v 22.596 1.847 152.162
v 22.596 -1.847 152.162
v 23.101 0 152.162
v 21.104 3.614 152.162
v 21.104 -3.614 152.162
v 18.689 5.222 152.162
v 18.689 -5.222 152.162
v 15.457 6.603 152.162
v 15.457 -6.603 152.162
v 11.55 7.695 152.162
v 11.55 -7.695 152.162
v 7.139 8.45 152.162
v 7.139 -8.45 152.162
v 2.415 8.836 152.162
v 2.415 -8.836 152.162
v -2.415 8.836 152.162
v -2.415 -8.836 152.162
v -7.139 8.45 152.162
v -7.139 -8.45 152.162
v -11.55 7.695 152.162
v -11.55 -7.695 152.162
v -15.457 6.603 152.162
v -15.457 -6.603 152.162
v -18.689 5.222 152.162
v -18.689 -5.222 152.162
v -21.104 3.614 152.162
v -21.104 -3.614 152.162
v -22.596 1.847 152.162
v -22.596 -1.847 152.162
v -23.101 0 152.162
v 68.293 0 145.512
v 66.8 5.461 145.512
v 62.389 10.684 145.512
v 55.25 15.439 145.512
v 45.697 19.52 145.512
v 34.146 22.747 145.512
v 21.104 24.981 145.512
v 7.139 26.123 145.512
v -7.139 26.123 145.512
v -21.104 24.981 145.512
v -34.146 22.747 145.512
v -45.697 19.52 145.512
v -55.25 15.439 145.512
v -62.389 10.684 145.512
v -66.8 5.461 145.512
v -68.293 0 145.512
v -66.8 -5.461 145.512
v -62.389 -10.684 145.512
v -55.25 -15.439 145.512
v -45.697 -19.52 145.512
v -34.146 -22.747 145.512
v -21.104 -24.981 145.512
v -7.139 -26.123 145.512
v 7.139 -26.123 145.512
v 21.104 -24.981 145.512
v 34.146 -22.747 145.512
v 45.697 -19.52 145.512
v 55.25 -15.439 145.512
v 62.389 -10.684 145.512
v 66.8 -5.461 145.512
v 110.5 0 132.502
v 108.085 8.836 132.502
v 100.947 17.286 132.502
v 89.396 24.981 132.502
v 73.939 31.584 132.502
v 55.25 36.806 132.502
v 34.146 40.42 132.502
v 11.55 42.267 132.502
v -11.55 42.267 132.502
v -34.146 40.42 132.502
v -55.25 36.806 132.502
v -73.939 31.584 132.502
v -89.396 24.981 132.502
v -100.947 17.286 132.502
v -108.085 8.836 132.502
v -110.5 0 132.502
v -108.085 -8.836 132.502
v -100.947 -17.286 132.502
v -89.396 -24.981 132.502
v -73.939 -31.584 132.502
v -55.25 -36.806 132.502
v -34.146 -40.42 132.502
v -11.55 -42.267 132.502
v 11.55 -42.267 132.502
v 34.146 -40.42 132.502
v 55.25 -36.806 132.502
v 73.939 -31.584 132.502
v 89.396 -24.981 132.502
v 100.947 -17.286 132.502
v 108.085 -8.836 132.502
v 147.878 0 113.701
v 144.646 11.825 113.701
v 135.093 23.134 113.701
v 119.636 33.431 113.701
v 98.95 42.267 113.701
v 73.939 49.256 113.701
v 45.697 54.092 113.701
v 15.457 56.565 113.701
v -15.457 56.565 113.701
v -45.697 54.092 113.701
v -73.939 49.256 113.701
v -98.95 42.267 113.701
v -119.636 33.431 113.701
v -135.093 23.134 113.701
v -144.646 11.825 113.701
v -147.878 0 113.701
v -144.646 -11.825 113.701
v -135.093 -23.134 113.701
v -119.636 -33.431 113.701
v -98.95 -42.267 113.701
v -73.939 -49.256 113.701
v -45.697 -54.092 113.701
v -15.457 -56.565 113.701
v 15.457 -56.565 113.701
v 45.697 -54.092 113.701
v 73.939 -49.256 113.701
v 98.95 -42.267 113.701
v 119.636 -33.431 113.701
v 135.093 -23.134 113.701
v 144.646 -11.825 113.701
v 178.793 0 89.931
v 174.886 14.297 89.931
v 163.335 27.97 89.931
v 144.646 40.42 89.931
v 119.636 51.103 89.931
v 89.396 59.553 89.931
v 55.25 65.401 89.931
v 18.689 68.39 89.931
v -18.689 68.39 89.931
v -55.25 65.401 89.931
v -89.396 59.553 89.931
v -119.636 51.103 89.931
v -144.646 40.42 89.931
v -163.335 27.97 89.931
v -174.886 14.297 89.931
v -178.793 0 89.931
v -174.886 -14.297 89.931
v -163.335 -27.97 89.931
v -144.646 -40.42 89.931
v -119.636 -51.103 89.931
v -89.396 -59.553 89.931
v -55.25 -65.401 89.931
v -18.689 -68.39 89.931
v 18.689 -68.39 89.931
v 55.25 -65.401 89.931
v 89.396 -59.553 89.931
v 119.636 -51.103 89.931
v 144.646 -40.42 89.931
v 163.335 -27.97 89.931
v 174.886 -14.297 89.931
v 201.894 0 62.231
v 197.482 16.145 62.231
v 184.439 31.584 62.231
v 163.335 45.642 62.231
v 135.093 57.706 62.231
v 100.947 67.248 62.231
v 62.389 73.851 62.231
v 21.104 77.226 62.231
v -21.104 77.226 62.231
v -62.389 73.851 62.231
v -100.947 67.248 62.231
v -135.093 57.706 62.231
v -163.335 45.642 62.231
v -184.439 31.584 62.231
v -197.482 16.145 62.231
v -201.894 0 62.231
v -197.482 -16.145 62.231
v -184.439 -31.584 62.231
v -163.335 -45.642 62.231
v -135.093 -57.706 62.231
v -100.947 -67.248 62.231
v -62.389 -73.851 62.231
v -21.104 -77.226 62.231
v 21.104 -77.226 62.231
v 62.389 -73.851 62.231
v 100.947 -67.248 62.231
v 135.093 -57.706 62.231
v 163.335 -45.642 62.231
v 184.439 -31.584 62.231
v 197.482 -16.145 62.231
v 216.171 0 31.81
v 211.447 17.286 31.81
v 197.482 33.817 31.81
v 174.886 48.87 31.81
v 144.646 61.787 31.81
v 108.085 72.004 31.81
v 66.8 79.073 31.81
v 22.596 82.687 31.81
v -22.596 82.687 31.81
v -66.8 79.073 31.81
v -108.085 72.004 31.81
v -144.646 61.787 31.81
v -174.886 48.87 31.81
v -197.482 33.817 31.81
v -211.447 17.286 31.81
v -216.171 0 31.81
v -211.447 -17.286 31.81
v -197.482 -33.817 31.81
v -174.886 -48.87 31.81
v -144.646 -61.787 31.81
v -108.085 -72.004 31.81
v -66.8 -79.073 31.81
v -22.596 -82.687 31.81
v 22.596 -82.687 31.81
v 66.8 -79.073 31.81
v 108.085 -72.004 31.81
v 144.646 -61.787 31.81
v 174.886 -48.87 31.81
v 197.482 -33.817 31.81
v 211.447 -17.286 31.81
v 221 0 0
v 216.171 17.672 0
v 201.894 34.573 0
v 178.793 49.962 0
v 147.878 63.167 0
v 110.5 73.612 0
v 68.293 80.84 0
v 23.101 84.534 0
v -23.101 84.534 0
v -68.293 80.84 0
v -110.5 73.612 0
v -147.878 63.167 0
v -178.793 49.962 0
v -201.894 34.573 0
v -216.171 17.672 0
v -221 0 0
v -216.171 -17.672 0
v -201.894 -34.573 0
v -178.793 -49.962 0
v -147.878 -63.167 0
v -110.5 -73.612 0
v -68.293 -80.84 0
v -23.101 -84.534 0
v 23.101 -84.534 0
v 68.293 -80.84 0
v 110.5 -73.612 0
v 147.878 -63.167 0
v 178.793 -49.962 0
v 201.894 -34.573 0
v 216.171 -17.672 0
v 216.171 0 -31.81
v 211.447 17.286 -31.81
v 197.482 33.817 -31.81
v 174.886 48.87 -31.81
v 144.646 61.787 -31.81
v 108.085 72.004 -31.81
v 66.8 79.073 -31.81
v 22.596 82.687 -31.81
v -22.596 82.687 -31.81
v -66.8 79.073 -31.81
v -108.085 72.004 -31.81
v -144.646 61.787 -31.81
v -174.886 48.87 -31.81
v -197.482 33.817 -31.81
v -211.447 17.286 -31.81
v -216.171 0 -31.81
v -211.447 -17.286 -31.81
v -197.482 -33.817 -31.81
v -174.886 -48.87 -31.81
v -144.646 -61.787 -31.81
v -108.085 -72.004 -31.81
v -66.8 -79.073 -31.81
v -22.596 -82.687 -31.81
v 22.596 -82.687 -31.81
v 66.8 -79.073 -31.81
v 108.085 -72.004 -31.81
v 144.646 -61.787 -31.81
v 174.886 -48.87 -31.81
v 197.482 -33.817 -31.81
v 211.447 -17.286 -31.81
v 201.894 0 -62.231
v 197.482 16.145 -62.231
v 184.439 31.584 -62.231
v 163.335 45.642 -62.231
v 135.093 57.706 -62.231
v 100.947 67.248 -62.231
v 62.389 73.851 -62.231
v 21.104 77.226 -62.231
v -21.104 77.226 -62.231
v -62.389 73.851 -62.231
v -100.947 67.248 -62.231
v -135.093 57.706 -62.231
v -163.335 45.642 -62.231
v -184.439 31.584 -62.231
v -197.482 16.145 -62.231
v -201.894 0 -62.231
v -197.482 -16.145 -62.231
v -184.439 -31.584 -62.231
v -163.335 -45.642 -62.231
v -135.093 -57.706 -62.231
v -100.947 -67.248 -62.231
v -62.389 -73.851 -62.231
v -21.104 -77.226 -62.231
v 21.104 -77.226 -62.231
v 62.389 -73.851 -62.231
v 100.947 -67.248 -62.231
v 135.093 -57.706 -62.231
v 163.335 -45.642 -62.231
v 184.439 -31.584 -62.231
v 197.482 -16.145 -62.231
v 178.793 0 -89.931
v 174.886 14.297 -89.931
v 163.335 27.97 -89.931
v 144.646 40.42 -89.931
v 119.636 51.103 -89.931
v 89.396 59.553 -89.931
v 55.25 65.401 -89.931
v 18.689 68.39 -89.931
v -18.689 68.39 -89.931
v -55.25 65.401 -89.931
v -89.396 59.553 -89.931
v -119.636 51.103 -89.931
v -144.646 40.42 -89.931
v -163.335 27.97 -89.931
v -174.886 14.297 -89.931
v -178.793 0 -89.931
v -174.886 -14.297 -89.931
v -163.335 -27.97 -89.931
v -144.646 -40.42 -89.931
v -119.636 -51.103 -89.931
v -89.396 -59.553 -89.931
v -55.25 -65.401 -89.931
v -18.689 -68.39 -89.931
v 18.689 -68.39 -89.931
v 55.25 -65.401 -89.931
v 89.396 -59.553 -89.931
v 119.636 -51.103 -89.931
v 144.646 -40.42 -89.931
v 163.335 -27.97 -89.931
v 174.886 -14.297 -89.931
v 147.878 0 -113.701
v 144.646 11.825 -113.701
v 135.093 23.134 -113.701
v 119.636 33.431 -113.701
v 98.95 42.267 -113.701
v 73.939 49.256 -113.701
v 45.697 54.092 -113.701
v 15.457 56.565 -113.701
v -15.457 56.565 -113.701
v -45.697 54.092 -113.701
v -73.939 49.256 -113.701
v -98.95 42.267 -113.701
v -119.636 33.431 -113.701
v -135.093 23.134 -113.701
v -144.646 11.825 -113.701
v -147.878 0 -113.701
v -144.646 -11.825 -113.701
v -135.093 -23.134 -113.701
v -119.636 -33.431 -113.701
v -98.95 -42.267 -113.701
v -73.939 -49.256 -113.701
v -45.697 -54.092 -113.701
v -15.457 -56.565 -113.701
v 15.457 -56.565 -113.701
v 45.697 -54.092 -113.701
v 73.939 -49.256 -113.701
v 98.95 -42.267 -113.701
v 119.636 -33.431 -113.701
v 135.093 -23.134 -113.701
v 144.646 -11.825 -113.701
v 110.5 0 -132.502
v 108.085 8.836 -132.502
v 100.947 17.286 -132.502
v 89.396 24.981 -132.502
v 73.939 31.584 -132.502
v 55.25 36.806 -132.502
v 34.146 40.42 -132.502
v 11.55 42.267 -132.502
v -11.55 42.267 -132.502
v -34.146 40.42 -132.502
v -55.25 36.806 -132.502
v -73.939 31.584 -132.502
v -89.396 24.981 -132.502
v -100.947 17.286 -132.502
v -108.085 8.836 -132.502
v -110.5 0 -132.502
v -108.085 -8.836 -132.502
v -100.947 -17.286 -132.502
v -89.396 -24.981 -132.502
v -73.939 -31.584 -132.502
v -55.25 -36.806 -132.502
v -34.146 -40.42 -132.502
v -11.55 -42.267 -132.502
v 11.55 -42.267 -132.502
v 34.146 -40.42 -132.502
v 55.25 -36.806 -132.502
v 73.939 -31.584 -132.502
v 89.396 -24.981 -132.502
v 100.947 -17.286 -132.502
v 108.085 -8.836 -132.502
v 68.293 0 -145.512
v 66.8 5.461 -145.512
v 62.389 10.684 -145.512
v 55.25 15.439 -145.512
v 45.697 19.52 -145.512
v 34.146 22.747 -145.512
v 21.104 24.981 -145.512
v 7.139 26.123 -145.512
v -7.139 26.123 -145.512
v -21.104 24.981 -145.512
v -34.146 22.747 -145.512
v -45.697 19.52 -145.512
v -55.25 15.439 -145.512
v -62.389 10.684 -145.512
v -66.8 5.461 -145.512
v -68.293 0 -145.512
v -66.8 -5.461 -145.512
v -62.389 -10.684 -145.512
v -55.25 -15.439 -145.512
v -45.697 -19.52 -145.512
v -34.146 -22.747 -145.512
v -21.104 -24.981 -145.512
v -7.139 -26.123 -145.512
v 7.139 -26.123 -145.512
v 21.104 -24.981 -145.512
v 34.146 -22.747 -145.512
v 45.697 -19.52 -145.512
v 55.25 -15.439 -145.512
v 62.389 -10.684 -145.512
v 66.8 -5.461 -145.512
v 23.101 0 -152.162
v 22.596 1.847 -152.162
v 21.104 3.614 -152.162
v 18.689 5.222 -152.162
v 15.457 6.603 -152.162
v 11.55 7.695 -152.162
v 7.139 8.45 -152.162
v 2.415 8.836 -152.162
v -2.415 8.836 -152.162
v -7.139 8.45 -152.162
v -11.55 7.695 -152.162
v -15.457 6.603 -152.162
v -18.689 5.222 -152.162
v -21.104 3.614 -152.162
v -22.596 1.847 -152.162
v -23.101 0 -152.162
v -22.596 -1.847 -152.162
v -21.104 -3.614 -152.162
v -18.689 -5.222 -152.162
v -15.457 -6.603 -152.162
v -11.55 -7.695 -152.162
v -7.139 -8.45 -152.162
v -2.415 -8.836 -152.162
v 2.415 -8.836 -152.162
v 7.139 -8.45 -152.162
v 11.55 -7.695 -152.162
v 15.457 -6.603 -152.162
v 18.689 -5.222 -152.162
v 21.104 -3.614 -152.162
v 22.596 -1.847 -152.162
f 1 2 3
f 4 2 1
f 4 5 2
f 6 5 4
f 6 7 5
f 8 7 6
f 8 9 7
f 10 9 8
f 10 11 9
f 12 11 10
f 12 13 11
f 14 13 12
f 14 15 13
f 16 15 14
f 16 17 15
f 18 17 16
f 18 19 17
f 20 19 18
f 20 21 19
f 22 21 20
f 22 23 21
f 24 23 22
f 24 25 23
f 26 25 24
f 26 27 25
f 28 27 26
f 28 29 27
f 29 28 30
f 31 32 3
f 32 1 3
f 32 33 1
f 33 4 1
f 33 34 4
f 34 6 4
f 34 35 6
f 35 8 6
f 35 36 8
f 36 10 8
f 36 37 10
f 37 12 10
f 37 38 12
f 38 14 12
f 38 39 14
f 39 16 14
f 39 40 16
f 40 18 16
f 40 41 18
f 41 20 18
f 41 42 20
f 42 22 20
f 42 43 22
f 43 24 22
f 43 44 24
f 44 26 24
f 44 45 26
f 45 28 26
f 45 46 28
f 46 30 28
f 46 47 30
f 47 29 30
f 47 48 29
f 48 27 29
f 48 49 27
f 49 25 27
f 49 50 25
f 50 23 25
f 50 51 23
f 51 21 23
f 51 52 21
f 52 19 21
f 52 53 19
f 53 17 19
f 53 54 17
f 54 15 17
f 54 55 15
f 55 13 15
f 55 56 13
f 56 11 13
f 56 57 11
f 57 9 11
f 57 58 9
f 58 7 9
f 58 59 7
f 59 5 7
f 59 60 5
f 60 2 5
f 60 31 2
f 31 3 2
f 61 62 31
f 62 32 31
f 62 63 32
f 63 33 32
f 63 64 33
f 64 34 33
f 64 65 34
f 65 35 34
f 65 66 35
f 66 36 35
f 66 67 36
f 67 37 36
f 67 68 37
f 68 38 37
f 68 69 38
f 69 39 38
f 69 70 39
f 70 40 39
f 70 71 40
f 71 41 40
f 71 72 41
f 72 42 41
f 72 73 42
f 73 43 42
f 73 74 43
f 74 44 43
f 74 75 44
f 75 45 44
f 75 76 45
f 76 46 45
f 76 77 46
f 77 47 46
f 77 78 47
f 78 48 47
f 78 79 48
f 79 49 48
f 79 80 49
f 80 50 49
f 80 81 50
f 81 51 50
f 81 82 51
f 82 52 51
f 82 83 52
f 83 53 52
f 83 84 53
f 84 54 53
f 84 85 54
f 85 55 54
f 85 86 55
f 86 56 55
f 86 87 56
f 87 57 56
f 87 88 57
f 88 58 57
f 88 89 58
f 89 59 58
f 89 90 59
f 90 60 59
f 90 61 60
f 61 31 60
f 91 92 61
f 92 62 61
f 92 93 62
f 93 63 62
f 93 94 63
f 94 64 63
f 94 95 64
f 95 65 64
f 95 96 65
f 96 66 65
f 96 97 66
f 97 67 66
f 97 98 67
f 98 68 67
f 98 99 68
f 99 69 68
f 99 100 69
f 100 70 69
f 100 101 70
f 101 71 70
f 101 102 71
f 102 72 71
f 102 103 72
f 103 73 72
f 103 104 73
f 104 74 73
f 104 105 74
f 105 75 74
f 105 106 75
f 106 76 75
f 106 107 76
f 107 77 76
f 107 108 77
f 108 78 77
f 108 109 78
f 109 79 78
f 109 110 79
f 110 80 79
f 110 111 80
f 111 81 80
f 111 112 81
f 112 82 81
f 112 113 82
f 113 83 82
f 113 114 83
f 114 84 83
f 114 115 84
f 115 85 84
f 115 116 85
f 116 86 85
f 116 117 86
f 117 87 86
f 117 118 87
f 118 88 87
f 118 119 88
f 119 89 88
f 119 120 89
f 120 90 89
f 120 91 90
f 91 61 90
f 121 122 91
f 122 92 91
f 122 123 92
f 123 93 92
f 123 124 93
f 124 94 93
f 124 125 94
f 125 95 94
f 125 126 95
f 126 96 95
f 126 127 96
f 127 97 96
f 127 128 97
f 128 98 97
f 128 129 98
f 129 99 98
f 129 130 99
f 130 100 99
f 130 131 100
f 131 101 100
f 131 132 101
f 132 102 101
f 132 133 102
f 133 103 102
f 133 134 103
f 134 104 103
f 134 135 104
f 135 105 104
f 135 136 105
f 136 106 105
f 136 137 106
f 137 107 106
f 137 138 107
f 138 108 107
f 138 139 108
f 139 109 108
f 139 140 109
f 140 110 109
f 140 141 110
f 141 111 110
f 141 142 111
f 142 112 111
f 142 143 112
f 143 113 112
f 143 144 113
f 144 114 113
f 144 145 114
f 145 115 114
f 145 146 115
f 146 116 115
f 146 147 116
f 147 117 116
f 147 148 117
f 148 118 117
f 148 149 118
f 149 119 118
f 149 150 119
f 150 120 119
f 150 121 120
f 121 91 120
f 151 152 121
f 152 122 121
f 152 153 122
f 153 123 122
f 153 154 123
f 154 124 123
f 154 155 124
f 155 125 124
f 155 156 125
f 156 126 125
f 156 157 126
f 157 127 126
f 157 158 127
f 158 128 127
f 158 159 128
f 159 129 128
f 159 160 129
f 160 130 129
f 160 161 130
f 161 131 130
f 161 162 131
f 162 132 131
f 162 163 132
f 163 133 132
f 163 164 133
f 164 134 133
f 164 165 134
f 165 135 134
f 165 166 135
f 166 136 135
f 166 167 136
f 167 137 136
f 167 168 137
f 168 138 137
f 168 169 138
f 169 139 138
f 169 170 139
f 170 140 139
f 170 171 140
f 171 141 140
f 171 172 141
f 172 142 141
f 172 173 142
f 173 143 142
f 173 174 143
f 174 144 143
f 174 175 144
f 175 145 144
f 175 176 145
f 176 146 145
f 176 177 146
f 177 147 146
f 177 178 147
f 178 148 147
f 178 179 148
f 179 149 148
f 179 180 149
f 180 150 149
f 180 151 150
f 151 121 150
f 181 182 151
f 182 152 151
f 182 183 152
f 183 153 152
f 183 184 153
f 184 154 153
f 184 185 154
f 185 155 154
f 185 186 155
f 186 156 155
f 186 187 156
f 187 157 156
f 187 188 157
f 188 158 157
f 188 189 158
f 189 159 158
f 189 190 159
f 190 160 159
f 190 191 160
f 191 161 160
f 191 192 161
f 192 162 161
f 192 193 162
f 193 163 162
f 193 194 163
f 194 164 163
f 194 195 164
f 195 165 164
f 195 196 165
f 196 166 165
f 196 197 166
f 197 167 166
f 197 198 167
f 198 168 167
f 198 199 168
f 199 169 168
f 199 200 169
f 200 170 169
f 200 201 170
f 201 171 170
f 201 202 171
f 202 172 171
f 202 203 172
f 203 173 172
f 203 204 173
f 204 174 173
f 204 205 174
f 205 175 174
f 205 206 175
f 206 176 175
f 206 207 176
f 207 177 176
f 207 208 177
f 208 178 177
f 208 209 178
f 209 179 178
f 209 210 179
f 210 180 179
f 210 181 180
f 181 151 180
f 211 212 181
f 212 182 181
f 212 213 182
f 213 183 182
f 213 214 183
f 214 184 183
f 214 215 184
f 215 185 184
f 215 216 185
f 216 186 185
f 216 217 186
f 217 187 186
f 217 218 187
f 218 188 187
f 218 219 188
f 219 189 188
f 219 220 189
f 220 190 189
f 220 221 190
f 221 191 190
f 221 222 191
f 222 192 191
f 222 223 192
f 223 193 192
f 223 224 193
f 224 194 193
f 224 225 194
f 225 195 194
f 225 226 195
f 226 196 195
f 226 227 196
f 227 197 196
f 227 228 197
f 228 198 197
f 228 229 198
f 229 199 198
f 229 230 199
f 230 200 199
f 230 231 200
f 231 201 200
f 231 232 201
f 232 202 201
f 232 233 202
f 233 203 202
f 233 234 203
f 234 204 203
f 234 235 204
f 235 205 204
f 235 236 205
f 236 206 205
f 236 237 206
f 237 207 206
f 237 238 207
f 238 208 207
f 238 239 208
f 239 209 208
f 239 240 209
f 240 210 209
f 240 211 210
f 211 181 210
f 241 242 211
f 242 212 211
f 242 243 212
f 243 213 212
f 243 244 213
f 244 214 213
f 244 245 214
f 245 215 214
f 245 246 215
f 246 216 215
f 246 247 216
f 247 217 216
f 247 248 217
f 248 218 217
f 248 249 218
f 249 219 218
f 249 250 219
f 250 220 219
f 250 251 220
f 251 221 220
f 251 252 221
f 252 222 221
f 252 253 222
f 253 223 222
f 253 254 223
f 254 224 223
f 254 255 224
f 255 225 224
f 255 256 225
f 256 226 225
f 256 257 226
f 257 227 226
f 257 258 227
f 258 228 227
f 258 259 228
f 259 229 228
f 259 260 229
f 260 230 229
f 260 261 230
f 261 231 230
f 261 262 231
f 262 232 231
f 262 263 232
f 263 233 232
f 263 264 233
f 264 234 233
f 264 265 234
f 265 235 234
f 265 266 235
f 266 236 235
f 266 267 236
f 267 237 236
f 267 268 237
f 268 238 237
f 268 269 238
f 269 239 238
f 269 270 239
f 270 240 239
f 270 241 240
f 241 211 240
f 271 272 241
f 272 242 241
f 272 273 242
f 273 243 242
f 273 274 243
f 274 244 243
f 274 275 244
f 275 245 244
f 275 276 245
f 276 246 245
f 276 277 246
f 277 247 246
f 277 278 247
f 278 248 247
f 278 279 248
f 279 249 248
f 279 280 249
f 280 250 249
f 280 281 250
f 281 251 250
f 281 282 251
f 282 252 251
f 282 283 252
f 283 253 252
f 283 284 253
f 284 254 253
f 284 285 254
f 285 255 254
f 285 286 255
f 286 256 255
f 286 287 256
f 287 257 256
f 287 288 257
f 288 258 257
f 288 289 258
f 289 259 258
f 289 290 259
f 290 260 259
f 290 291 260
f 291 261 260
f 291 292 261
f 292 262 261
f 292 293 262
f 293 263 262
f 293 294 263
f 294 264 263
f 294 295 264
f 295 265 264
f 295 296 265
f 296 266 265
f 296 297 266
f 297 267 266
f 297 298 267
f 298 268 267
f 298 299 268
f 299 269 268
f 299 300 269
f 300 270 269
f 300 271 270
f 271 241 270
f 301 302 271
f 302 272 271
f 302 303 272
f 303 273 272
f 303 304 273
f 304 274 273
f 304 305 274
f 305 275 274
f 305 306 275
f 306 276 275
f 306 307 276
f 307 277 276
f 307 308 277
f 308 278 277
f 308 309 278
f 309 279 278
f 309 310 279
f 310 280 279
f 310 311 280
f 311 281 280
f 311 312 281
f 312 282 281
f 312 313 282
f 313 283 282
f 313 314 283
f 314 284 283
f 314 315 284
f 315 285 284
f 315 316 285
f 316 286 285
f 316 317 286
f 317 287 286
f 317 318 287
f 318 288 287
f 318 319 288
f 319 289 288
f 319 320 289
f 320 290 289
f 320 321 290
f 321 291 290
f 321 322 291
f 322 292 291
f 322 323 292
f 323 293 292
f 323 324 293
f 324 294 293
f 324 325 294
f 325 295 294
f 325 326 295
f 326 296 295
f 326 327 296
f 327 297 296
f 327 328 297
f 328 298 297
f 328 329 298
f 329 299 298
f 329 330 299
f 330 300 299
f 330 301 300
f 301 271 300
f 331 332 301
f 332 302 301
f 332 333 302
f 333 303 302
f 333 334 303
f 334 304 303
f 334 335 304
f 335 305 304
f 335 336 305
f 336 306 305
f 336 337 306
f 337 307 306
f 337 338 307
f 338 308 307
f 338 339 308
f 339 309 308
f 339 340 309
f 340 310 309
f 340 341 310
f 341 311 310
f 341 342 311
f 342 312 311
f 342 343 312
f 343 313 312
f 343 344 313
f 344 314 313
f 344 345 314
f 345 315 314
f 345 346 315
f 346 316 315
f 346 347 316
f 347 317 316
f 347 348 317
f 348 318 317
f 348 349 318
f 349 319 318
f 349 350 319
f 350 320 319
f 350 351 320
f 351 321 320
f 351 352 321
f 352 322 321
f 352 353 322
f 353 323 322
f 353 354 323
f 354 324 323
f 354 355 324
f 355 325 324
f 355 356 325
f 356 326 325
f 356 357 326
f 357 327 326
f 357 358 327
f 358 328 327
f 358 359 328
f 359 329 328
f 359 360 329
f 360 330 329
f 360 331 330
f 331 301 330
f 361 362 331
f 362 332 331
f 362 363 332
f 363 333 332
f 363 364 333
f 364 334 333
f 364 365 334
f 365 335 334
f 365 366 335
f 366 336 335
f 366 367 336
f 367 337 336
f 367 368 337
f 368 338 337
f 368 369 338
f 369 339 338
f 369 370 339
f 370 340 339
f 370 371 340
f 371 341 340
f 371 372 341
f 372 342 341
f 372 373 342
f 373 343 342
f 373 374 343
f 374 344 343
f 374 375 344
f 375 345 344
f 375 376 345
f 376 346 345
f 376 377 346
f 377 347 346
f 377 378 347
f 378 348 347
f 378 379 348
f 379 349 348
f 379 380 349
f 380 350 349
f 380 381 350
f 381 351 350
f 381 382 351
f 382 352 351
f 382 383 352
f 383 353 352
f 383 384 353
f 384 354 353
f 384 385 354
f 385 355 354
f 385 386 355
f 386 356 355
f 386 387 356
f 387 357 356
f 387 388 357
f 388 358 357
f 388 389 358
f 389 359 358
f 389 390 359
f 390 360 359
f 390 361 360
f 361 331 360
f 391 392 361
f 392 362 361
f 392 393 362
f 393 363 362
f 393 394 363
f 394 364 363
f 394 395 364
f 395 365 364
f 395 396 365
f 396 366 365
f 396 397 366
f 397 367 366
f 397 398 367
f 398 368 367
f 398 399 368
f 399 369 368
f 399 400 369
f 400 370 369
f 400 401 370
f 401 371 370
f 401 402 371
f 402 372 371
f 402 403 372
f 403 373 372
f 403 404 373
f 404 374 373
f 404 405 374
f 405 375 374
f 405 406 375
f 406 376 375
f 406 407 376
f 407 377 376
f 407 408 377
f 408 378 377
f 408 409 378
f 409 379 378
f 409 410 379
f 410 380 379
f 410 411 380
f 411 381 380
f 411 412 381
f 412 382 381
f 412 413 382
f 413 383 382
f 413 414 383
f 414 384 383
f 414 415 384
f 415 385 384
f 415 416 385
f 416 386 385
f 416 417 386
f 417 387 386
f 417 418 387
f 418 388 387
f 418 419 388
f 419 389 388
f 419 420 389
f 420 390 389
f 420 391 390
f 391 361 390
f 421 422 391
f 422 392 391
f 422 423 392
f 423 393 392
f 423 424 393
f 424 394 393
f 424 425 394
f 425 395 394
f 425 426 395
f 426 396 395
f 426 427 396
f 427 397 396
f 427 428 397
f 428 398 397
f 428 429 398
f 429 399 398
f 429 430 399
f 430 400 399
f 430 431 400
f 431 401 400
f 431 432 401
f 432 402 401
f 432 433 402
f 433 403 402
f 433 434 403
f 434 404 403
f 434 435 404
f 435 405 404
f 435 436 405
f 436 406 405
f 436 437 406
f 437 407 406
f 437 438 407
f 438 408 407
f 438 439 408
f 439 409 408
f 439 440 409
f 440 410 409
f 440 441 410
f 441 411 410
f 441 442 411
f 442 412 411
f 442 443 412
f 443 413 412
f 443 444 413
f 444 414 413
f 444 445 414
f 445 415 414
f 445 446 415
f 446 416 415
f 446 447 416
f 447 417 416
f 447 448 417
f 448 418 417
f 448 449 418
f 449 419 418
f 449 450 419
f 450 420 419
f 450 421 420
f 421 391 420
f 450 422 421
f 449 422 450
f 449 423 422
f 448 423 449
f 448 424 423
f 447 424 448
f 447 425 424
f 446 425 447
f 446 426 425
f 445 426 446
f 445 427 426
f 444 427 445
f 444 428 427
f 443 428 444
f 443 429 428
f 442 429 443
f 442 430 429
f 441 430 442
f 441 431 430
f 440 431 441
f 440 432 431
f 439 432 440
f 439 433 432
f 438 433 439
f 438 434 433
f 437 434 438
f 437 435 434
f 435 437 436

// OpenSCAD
// Generated by SolidPython 1.0.1 on 2020-07-29 00:46:50


scale(v = [13, 5, 9]) {
	sphere(r = 17);
}
/***********************************************
*********      SolidPython code:      **********
************************************************
 
# import packages: SolidPython
from solid import *
from solid.utils import *
from itertools import chain, combinations, permutations


class Resize:

    def __init__(self, scad_file):
        self.scad_file = scad_file
        #self.scad_file = import_scad(scad_file)
        # cone/cylinder param:
        self.r1 = 0
        self.r2 = 0
        self.h = 0
        # rectangular prism param:
        self.w = 0
        self.l = 0
        # ellipse param:
        self.r = 0

    # import OpenScad code (file name corresponds to shape)


    # classify shape + parameters
    def assign(self, param1, param2, param3):
        if self.scad_file == 'cone.scad':
            self.r1 = param1
            self.r2 = param2
            self.h = param3
        elif self.scad_file == 'cylinder.scad':
            self.r1 = param1
            self.r2 = param2
            self.h = param3
        elif self.scad_file == 'rectangularPrism.scad':
            self.h = param1
            self.l = param2
            self.w = param3
        else:
            self.r = param1
            self.h = param2

    # resize parameters
    def iterate(self):
        x = range(3, 20, 2)
        i = 1
        if self.scad_file == 'cone.scad':
            tempList = list(permutations(x, 2))
            for temp in tempList:
                param1 = temp[0]
                param2 = temp[1]
                filepath = 'produced_scad_files/' + 'cone' + str(param1) + '_' + str(param2) + '_' + '.scad'
                scad_render_to_file(cylinder(h=param1, r1=param2, r2=0), filepath)

        elif self.scad_file == 'cylinder.scad':
            tempList = list(permutations(x, 3))
            for temp in tempList:
                param1 = temp[0]
                param2 = temp[1]
                filepath = 'produced_scad_files/' + 'cylinder' + str(param1) + '_' + str(param2) + '_' + '.scad'
                scad_render_to_file(cylinder(h=param1, r1=param2, r2=param2), filepath)

        elif self.scad_file == 'rectangularPrism.scad':
            tempList = list(permutations(x, 3))
            for temp in tempList:
                param1 = temp[0]
                param2 = temp[1]
                param3 = temp[2]
                filepath = 'produced_scad_files/' + 'rectangularPrism' + str(param1) + '_' + str(param2) + '_' + str(
                    param3) + '.scad'
                scad_render_to_file(cube(size=(param1, param2, param3)), filepath)

        elif self.scad_file == 'ellipse.scad':
            tempList = list(permutations(x, 4))
            for temp in tempList:
                param1 = temp[0]
                param2 = temp[1]
                param3 = temp[2]
                param4 = temp[3]
                filepath = 'produced_scad_files/' + 'ellipse' + str(param1) + '_' + str(param2) + '_' + str(param3) + '_' + str(param4) + '.scad'
                scad_render_to_file(scale([param1, param2, param3])(sphere(r=param4)), filepath)

    def render_to_scadfile(self):
        scad_render_to_file(scad, 'example.scad') 
 
************************************************/
